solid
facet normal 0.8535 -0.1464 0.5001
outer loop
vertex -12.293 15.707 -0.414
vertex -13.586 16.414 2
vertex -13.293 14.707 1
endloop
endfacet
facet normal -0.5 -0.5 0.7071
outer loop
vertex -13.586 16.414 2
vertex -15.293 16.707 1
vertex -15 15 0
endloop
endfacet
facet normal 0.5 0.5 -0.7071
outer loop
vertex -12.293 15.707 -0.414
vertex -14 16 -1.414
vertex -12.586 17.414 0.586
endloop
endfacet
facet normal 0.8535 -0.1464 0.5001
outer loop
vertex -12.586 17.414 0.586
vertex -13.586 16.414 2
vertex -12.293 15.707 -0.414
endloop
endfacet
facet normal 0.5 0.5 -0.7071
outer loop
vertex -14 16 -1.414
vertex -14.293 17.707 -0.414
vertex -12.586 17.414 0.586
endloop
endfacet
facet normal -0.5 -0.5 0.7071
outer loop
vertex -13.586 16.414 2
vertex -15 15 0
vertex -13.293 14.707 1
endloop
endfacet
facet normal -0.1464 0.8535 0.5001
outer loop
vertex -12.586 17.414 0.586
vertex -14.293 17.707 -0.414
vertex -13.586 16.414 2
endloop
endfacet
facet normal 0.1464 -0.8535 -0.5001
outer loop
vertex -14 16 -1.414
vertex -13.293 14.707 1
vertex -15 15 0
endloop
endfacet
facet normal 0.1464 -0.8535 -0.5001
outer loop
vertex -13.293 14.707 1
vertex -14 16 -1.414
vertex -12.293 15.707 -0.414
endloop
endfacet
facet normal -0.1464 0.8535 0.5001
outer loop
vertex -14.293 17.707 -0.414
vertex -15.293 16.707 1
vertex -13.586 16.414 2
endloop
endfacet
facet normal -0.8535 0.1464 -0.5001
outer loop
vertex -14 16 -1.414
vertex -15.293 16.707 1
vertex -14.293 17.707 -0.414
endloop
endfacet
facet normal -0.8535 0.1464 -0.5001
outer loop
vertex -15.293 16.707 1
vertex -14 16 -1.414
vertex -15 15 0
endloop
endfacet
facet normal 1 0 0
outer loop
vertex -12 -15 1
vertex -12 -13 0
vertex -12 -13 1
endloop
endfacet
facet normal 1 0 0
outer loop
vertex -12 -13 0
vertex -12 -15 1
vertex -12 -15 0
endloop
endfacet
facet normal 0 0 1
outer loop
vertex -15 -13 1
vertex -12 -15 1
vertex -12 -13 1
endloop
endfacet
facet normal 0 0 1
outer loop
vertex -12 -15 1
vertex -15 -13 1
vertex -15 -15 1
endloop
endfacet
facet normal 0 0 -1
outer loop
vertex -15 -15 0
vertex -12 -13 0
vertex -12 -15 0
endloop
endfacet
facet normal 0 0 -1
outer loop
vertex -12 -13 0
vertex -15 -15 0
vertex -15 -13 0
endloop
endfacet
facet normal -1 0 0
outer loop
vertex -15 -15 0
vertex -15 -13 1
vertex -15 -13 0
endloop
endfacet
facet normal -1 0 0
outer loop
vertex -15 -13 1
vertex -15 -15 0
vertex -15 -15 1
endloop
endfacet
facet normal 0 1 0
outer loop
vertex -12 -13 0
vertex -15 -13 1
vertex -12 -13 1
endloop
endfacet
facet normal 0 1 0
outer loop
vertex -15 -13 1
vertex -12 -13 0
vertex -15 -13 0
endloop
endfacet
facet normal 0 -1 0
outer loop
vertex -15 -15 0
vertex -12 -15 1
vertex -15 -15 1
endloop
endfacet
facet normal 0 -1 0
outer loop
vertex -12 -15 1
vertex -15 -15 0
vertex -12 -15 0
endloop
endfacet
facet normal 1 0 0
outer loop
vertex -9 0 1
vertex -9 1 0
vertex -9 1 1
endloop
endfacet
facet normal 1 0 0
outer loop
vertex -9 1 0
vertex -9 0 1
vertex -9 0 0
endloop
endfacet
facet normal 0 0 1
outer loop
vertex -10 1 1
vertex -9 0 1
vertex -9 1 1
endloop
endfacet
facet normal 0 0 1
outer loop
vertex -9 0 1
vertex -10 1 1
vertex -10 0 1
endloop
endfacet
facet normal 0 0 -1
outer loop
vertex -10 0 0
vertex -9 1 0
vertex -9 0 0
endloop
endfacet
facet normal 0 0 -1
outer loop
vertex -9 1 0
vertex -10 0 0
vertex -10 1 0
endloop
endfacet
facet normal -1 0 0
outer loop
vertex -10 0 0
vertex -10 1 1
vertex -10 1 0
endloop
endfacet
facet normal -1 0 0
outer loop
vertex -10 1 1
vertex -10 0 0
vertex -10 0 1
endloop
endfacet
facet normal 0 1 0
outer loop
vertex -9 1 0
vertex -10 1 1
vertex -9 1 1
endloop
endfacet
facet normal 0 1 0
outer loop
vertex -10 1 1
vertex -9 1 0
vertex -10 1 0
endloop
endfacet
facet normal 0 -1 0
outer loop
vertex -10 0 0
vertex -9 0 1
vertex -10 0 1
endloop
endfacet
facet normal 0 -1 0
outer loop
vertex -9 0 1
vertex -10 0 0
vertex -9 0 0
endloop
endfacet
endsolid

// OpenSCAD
// Copyright Stephen Morrisson 2017
// All rights reserved

// {xyz, rot, trans, tr} Cube

module xyzCube(c, x, y, z)
{
    color(c) cube([x, y, z], false);
}

module rotCube(c, rotX, rotY, rotZ, x, y, z)
{
    rotate([rotX, rotY, rotZ]) xyzCube(c, x, y, z);
}
translate([-15, 15, 0,])rotCube("green", 45, 45, 45, 2,2,2);

module transCube(c, xOffset, yOffset, zOffset, x, y, z)
{
    translate([xOffset, yOffset, zOffset]) xyzCube(c, x, y, z);
}
transCube("brown", -15, -15, 0, 3, 2, 1);


module trCube(c, rotX, rotY, rotZ, xO, yO, zO, x, y, z)
{
    translate([xO, yO, zO])
    rotate([rotX, rotY, rotZ])
    xyzCube(c, x, y, z);
}
//trCube("yellow", 0,0,0, 0,0,0, 2, 3, 4);
//trCube("green", 45, 45, 45, 4, 3, 1, 5, 6, 7);
//trCube("blue", 0, 0, 45, 20, 0, 0, 5, 6, 7);
trCube("orange", 0,0,0, -10, 0, 0, 1,1,1);
//trCube("orange", 45,0,0, -15, 0, 0, 1,1,1);
//trCube("orange", 0,45,0, -20, 0, 0, 1,1,1);
//trCube("orange", 0,0,45, -25, 0, 0, 1,1,1);
